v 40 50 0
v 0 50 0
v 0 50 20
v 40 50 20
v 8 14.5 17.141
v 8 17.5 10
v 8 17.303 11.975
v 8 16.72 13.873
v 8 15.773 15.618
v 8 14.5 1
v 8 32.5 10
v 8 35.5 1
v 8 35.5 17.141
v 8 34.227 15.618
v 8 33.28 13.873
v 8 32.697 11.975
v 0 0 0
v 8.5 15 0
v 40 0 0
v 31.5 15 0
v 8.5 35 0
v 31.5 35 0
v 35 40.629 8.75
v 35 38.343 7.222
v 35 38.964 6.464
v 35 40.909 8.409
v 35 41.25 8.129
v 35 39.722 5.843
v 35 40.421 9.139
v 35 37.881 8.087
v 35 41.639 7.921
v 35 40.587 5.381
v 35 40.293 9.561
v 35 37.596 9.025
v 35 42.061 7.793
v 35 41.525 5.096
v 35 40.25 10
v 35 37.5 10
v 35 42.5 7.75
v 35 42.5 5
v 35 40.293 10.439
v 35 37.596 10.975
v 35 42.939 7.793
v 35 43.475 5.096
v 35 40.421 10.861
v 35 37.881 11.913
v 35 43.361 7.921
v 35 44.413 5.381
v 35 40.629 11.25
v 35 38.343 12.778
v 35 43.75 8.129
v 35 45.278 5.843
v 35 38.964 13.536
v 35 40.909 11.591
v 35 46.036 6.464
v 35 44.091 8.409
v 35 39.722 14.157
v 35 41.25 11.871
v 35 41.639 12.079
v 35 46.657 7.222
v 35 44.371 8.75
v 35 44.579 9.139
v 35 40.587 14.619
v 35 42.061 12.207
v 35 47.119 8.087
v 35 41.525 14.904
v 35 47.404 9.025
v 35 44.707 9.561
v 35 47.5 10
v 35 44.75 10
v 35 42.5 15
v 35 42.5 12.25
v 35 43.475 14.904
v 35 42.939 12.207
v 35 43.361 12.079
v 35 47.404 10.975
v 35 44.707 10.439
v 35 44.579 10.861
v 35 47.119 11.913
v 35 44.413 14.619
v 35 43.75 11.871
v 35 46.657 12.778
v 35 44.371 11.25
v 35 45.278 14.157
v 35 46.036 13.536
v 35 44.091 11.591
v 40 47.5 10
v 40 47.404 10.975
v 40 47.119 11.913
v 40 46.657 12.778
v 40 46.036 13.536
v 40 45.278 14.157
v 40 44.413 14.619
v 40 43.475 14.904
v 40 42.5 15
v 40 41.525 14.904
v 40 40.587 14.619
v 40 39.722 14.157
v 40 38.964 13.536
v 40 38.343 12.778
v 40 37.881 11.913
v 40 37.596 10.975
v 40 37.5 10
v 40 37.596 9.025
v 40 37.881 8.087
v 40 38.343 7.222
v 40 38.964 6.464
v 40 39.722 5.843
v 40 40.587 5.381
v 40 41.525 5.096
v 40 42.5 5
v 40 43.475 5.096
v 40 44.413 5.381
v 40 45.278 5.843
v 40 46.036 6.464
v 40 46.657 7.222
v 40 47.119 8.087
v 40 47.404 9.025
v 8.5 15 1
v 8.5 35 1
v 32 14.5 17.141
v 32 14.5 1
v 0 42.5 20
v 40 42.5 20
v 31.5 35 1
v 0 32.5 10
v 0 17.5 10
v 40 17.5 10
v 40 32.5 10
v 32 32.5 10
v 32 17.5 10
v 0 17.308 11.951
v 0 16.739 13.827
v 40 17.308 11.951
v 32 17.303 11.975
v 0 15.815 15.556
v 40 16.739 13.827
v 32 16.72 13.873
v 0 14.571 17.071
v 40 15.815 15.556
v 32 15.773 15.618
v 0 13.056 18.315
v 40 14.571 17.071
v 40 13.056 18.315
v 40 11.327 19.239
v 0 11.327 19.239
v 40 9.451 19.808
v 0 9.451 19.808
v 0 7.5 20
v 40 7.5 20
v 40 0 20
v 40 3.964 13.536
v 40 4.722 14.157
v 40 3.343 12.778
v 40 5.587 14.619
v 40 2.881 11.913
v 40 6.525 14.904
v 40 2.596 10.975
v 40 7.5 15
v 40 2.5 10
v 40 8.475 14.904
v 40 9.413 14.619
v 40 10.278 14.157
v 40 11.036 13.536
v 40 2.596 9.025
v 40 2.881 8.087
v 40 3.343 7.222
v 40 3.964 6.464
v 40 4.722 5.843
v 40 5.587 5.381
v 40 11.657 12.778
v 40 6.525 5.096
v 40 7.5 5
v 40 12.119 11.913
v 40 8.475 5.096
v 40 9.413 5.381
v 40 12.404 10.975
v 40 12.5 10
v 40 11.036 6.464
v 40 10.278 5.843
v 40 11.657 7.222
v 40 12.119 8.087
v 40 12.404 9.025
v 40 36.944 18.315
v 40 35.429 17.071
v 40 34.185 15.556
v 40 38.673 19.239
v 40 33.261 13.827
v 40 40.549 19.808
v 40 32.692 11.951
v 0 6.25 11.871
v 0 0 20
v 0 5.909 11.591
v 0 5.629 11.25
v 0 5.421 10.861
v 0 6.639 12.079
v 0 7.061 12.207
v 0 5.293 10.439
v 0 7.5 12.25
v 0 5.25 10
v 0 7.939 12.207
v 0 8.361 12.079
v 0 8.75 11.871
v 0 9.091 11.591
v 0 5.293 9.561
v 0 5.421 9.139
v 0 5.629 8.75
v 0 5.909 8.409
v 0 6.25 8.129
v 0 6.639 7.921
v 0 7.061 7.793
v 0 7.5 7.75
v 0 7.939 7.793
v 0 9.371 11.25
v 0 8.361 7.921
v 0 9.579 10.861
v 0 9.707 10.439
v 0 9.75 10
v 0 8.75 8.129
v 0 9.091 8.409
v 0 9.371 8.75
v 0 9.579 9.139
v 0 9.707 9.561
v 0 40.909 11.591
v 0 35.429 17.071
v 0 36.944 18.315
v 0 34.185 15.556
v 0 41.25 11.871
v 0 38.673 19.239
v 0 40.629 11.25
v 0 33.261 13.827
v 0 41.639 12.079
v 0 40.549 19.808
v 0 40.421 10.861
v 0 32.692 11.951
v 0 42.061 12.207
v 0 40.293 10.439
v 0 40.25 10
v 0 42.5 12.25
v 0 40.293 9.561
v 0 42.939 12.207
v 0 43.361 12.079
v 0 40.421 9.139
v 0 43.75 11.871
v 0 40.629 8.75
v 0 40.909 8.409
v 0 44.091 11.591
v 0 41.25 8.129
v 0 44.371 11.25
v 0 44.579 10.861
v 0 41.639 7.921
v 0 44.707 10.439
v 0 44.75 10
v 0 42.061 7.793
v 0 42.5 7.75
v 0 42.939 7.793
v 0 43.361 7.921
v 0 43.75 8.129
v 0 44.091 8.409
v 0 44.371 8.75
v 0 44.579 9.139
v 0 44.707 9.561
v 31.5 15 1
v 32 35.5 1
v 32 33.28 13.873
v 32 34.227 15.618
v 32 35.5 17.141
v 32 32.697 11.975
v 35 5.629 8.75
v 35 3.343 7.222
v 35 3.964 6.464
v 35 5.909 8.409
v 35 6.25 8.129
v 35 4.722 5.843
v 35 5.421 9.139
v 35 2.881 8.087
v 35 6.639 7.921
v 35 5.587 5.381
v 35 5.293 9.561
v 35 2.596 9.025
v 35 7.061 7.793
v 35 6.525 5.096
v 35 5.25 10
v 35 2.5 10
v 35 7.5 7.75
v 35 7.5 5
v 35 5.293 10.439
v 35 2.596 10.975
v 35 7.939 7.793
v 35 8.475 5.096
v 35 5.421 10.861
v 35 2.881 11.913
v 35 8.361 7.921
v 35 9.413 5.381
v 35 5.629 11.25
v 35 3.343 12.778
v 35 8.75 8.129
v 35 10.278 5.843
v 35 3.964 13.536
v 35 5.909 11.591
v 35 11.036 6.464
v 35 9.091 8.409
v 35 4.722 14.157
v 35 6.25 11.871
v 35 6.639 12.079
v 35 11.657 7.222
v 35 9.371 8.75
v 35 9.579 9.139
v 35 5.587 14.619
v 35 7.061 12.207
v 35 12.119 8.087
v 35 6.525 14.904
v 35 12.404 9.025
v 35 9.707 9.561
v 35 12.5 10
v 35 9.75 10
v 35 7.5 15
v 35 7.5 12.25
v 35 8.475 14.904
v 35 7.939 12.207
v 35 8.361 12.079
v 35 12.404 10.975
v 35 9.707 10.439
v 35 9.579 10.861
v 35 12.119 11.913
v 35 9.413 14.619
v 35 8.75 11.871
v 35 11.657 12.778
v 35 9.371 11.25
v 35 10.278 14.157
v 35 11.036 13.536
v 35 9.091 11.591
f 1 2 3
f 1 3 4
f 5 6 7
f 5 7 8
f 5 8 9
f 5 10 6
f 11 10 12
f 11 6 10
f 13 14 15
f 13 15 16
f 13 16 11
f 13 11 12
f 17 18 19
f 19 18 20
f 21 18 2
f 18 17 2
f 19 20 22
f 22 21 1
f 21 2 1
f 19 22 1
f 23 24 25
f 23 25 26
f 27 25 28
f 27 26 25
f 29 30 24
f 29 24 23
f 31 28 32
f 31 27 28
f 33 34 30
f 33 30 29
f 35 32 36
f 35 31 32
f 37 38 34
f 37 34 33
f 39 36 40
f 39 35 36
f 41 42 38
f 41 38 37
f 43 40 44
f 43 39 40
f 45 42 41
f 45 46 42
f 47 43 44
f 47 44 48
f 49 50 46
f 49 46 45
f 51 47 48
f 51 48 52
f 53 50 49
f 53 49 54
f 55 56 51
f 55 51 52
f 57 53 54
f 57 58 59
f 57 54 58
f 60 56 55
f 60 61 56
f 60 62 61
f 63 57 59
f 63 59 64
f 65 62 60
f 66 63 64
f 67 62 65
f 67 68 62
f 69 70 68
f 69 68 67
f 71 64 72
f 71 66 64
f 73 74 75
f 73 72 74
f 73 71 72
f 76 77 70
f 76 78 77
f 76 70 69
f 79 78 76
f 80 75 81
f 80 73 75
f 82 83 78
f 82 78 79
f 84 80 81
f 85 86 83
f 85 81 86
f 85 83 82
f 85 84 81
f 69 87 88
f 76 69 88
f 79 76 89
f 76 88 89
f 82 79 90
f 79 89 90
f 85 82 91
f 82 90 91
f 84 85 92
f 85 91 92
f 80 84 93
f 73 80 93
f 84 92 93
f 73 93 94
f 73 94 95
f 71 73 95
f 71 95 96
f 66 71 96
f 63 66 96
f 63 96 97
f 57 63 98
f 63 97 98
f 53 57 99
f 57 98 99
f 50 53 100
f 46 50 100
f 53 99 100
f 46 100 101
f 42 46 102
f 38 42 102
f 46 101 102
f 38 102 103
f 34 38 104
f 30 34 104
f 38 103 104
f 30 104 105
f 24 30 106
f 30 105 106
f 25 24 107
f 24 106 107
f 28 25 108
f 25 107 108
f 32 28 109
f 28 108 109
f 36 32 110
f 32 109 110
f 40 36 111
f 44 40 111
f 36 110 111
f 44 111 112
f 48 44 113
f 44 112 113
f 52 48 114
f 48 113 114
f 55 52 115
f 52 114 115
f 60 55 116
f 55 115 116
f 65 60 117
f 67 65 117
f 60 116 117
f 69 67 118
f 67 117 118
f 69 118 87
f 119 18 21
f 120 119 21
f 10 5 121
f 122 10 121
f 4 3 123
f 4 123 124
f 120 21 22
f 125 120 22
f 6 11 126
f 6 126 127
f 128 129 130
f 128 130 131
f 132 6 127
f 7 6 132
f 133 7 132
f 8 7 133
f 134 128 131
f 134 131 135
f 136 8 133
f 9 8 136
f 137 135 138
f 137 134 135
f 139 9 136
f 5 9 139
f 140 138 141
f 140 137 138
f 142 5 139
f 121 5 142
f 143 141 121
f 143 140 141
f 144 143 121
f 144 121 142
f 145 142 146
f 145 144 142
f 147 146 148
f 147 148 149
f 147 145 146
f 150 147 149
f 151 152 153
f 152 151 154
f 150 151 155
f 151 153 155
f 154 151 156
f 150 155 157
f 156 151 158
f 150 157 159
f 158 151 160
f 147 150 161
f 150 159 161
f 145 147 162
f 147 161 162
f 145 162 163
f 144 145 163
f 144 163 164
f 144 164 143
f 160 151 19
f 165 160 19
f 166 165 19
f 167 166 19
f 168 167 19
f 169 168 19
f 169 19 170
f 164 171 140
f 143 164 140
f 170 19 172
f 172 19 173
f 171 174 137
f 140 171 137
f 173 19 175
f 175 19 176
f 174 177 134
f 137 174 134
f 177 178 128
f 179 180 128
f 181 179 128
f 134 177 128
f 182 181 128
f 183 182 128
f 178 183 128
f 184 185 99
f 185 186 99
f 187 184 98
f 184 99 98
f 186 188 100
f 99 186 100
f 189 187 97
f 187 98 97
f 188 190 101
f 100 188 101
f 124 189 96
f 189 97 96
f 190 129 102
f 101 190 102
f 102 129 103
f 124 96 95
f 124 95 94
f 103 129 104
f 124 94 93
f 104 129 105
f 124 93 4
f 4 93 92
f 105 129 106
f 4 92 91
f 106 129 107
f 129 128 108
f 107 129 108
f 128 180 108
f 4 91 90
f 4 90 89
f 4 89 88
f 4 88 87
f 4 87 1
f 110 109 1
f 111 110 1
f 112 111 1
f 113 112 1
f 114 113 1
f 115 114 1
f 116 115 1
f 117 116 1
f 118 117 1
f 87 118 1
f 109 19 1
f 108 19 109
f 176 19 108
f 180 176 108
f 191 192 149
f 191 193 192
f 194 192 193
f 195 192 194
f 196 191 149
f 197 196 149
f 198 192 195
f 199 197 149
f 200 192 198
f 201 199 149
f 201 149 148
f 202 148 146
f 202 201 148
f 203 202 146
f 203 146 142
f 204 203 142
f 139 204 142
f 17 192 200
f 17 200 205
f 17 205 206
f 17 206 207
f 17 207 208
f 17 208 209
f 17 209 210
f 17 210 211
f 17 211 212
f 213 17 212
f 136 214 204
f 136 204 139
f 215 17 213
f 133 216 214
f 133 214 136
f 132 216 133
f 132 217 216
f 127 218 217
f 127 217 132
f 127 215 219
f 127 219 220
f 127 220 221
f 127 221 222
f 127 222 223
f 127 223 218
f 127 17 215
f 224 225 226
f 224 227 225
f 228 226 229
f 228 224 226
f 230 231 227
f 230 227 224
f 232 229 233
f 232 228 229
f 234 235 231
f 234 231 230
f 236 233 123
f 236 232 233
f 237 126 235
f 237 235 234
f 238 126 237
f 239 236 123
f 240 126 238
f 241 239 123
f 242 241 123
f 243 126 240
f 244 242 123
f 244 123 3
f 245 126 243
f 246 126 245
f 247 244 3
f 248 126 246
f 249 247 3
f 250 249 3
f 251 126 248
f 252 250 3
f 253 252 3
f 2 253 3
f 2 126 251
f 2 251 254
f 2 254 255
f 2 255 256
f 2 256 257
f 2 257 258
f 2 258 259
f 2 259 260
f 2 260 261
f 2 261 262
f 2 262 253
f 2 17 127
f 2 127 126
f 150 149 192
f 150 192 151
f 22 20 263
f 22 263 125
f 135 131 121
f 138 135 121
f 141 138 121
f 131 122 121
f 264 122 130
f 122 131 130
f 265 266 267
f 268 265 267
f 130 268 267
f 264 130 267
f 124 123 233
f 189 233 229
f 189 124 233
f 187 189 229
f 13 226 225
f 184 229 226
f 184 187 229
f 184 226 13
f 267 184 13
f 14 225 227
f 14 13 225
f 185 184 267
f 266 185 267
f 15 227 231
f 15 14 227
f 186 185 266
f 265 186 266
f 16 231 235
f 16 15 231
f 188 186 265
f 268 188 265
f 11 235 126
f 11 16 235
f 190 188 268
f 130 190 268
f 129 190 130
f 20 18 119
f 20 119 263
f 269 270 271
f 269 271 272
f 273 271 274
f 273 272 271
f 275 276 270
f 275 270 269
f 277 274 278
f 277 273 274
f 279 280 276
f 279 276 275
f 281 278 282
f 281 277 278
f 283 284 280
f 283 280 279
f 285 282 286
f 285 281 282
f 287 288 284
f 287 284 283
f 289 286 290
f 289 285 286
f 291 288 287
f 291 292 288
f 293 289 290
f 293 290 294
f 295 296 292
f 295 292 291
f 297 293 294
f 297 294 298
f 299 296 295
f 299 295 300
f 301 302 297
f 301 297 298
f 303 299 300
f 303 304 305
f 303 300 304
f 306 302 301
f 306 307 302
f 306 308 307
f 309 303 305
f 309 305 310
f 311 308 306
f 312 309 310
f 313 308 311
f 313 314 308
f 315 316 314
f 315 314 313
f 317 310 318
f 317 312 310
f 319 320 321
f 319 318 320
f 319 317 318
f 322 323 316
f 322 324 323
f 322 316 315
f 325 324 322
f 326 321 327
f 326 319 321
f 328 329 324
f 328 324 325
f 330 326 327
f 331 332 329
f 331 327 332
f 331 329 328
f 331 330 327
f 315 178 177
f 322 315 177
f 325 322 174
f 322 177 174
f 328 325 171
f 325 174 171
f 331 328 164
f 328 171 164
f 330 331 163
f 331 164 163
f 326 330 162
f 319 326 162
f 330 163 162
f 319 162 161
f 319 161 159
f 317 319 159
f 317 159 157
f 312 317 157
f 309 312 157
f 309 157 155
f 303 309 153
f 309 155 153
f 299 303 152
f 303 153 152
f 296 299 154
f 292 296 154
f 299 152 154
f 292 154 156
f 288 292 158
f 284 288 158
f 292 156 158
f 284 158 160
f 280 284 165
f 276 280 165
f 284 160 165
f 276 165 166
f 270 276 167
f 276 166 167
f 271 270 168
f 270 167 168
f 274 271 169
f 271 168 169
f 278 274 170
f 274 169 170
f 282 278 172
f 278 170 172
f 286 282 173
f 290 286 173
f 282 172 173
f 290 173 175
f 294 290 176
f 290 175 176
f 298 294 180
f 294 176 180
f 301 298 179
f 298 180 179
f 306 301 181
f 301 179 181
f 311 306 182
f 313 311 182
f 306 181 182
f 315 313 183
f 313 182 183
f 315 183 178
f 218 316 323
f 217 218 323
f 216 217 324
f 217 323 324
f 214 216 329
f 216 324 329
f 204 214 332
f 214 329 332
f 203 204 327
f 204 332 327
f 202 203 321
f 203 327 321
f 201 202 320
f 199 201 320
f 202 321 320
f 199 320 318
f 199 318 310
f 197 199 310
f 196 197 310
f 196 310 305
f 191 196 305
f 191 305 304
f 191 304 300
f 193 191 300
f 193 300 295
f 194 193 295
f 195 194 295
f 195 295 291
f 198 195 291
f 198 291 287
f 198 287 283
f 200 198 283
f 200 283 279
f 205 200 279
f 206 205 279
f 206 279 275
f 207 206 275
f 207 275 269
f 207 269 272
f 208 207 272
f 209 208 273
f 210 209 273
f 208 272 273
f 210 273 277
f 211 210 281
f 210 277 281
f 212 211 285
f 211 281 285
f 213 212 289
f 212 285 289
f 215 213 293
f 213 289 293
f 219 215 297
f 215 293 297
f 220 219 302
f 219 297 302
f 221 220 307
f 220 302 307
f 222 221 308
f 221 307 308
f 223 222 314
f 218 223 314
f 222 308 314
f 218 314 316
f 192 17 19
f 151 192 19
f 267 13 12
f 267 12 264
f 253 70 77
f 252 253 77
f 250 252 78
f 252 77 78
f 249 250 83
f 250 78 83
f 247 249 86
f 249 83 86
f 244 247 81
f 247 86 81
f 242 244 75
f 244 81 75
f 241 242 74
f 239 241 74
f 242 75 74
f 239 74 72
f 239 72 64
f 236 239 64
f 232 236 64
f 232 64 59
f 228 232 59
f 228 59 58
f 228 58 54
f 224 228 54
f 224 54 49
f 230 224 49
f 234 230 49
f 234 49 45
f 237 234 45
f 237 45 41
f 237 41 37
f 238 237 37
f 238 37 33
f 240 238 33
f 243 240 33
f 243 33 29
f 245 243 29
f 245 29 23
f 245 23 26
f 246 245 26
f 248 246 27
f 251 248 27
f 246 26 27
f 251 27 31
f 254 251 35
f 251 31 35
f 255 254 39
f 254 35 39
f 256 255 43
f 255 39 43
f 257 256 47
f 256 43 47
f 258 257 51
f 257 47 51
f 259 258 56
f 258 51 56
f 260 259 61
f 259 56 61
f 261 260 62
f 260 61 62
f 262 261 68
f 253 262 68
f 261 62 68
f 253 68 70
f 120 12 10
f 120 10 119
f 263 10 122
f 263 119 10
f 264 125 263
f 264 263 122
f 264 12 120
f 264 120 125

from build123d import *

# Parameters (mm, degrees)
SKETCH_W        = 40
SKETCH_H        = 50
SKETCH_W_2      = 23
SKETCH_H_2      = 20
PAD_DEPTH       = 20
SKETCH001_R     = 2.25
POCKET_DEPTH    = 40.001
SKETCH002_W     = 24
SKETCH002_H     = 21
POCKET001_DEPTH = 19
SKETCH003_R     = 5
POCKET002_DEPTH = 5
POCKET003_DEPTH = 40.001


with BuildPart() as part:
    # Sketch → Pad (new body)
    with BuildSketch(Plane.XY):
        with Locations((20, 25)):
            Rectangle(SKETCH_W, SKETCH_H)
        with Locations((20, 25)):
            Rectangle(SKETCH_W_2, SKETCH_H_2, mode=Mode.SUBTRACT)
    extrude(amount=PAD_DEPTH)

    # Sketch001 → Pocket (cut, through all)
    with BuildSketch(Plane.YZ.offset(40)):
        with Locations((7.5, 10)):
            Circle(SKETCH001_R)
        with Locations((42.5, 10)):
            Circle(SKETCH001_R)
    extrude(amount=-POCKET_DEPTH, mode=Mode.SUBTRACT)

    # Sketch002 → Pocket001 (cut)
    with BuildSketch(Plane.XY.offset(20)):
        with Locations((20, 25)):
            Rectangle(SKETCH002_W, SKETCH002_H)
    extrude(amount=-POCKET001_DEPTH, mode=Mode.SUBTRACT)

    # Sketch003 → Pocket002 (cut)
    with BuildSketch(Plane.YZ.offset(40)):
        with Locations((7.5, 10)):
            Circle(SKETCH003_R)
        with Locations((42.5, 10)):
            Circle(SKETCH003_R)
    extrude(amount=-POCKET002_DEPTH, mode=Mode.SUBTRACT)

    # Sketch004 → Pocket003 (cut, through all)
    with BuildSketch(Plane.YZ.offset(40)):
        with BuildLine():
            ThreePointArc((17.5, 10), (14.571068, 17.071068), (7.5, 20))
            Line((7.5, 20), (7.5, 22))
            Line((7.5, 22), (42.5, 22))
            Line((42.5, 22), (42.5, 20))
            ThreePointArc((42.5, 20), (35.428932, 17.071068), (32.5, 10))
            Line((32.5, 10), (17.5, 10))
        make_face()
    extrude(amount=-POCKET003_DEPTH, mode=Mode.SUBTRACT)


solid = part.part
